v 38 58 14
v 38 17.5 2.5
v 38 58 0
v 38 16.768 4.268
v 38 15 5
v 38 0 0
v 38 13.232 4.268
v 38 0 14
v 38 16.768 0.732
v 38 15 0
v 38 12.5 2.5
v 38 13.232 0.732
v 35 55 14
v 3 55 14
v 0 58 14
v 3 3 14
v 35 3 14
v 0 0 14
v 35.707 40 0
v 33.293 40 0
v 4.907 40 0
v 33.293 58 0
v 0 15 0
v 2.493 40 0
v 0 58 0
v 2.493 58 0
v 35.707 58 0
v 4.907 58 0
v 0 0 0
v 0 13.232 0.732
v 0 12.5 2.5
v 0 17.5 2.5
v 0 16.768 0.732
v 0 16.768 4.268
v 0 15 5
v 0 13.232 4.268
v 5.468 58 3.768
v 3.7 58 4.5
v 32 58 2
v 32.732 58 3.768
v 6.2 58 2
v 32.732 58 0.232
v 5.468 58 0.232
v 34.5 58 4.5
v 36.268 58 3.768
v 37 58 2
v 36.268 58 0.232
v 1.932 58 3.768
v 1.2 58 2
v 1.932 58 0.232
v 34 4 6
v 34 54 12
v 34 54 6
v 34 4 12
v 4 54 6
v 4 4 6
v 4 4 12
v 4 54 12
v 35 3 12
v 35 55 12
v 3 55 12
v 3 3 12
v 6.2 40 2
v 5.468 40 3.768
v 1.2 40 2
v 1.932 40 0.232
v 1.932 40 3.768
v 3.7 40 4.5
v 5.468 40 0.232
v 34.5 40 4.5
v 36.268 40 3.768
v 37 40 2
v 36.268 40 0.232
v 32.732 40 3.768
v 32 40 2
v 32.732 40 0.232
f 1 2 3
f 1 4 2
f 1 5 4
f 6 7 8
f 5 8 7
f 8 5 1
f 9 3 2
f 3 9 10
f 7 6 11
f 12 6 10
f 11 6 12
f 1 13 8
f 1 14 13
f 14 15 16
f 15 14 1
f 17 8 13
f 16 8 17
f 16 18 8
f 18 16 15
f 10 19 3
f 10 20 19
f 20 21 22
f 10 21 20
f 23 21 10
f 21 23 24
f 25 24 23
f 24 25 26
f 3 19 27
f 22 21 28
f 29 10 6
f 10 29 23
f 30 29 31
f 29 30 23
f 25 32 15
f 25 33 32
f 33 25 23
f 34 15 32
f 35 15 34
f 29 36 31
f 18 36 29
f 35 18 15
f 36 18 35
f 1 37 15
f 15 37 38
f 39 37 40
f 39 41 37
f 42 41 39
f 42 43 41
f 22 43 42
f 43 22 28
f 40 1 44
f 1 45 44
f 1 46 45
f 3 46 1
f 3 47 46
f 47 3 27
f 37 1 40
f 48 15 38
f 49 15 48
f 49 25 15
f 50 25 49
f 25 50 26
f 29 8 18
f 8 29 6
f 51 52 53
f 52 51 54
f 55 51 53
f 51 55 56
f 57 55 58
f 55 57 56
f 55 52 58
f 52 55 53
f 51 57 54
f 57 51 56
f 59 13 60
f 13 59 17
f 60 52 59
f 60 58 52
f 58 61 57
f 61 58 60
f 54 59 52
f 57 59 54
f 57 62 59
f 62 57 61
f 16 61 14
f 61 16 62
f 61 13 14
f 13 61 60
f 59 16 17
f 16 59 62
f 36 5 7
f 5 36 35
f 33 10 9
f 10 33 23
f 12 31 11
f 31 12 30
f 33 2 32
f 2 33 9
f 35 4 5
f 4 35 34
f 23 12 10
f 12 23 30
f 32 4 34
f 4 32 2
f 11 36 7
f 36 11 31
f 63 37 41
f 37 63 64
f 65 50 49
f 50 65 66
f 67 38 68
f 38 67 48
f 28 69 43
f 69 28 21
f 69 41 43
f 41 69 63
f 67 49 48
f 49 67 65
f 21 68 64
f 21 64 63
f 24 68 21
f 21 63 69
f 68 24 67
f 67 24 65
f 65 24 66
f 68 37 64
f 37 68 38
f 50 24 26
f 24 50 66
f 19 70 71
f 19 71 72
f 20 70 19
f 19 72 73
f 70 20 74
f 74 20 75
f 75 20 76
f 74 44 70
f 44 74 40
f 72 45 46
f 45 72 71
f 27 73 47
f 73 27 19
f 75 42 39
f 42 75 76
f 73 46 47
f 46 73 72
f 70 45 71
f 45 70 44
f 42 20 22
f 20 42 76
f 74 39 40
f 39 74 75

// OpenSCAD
difference(){
cube([38,58,14]);
 translate([4,4,6]) cube([30,50,14]);
 translate([3,3,12]) cube([32,52,14]);
 rotate([0,90,0]) translate([-2.5,15,-1]) cylinder(40,2.5,2.5);
 rotate([90,90,0]) translate([-2,3.7,-80]) cylinder(40,2.5,2.5);
 rotate([90,90,0]) translate([-2,34.5,-80]) cylinder(40,2.5,2.5);
}
